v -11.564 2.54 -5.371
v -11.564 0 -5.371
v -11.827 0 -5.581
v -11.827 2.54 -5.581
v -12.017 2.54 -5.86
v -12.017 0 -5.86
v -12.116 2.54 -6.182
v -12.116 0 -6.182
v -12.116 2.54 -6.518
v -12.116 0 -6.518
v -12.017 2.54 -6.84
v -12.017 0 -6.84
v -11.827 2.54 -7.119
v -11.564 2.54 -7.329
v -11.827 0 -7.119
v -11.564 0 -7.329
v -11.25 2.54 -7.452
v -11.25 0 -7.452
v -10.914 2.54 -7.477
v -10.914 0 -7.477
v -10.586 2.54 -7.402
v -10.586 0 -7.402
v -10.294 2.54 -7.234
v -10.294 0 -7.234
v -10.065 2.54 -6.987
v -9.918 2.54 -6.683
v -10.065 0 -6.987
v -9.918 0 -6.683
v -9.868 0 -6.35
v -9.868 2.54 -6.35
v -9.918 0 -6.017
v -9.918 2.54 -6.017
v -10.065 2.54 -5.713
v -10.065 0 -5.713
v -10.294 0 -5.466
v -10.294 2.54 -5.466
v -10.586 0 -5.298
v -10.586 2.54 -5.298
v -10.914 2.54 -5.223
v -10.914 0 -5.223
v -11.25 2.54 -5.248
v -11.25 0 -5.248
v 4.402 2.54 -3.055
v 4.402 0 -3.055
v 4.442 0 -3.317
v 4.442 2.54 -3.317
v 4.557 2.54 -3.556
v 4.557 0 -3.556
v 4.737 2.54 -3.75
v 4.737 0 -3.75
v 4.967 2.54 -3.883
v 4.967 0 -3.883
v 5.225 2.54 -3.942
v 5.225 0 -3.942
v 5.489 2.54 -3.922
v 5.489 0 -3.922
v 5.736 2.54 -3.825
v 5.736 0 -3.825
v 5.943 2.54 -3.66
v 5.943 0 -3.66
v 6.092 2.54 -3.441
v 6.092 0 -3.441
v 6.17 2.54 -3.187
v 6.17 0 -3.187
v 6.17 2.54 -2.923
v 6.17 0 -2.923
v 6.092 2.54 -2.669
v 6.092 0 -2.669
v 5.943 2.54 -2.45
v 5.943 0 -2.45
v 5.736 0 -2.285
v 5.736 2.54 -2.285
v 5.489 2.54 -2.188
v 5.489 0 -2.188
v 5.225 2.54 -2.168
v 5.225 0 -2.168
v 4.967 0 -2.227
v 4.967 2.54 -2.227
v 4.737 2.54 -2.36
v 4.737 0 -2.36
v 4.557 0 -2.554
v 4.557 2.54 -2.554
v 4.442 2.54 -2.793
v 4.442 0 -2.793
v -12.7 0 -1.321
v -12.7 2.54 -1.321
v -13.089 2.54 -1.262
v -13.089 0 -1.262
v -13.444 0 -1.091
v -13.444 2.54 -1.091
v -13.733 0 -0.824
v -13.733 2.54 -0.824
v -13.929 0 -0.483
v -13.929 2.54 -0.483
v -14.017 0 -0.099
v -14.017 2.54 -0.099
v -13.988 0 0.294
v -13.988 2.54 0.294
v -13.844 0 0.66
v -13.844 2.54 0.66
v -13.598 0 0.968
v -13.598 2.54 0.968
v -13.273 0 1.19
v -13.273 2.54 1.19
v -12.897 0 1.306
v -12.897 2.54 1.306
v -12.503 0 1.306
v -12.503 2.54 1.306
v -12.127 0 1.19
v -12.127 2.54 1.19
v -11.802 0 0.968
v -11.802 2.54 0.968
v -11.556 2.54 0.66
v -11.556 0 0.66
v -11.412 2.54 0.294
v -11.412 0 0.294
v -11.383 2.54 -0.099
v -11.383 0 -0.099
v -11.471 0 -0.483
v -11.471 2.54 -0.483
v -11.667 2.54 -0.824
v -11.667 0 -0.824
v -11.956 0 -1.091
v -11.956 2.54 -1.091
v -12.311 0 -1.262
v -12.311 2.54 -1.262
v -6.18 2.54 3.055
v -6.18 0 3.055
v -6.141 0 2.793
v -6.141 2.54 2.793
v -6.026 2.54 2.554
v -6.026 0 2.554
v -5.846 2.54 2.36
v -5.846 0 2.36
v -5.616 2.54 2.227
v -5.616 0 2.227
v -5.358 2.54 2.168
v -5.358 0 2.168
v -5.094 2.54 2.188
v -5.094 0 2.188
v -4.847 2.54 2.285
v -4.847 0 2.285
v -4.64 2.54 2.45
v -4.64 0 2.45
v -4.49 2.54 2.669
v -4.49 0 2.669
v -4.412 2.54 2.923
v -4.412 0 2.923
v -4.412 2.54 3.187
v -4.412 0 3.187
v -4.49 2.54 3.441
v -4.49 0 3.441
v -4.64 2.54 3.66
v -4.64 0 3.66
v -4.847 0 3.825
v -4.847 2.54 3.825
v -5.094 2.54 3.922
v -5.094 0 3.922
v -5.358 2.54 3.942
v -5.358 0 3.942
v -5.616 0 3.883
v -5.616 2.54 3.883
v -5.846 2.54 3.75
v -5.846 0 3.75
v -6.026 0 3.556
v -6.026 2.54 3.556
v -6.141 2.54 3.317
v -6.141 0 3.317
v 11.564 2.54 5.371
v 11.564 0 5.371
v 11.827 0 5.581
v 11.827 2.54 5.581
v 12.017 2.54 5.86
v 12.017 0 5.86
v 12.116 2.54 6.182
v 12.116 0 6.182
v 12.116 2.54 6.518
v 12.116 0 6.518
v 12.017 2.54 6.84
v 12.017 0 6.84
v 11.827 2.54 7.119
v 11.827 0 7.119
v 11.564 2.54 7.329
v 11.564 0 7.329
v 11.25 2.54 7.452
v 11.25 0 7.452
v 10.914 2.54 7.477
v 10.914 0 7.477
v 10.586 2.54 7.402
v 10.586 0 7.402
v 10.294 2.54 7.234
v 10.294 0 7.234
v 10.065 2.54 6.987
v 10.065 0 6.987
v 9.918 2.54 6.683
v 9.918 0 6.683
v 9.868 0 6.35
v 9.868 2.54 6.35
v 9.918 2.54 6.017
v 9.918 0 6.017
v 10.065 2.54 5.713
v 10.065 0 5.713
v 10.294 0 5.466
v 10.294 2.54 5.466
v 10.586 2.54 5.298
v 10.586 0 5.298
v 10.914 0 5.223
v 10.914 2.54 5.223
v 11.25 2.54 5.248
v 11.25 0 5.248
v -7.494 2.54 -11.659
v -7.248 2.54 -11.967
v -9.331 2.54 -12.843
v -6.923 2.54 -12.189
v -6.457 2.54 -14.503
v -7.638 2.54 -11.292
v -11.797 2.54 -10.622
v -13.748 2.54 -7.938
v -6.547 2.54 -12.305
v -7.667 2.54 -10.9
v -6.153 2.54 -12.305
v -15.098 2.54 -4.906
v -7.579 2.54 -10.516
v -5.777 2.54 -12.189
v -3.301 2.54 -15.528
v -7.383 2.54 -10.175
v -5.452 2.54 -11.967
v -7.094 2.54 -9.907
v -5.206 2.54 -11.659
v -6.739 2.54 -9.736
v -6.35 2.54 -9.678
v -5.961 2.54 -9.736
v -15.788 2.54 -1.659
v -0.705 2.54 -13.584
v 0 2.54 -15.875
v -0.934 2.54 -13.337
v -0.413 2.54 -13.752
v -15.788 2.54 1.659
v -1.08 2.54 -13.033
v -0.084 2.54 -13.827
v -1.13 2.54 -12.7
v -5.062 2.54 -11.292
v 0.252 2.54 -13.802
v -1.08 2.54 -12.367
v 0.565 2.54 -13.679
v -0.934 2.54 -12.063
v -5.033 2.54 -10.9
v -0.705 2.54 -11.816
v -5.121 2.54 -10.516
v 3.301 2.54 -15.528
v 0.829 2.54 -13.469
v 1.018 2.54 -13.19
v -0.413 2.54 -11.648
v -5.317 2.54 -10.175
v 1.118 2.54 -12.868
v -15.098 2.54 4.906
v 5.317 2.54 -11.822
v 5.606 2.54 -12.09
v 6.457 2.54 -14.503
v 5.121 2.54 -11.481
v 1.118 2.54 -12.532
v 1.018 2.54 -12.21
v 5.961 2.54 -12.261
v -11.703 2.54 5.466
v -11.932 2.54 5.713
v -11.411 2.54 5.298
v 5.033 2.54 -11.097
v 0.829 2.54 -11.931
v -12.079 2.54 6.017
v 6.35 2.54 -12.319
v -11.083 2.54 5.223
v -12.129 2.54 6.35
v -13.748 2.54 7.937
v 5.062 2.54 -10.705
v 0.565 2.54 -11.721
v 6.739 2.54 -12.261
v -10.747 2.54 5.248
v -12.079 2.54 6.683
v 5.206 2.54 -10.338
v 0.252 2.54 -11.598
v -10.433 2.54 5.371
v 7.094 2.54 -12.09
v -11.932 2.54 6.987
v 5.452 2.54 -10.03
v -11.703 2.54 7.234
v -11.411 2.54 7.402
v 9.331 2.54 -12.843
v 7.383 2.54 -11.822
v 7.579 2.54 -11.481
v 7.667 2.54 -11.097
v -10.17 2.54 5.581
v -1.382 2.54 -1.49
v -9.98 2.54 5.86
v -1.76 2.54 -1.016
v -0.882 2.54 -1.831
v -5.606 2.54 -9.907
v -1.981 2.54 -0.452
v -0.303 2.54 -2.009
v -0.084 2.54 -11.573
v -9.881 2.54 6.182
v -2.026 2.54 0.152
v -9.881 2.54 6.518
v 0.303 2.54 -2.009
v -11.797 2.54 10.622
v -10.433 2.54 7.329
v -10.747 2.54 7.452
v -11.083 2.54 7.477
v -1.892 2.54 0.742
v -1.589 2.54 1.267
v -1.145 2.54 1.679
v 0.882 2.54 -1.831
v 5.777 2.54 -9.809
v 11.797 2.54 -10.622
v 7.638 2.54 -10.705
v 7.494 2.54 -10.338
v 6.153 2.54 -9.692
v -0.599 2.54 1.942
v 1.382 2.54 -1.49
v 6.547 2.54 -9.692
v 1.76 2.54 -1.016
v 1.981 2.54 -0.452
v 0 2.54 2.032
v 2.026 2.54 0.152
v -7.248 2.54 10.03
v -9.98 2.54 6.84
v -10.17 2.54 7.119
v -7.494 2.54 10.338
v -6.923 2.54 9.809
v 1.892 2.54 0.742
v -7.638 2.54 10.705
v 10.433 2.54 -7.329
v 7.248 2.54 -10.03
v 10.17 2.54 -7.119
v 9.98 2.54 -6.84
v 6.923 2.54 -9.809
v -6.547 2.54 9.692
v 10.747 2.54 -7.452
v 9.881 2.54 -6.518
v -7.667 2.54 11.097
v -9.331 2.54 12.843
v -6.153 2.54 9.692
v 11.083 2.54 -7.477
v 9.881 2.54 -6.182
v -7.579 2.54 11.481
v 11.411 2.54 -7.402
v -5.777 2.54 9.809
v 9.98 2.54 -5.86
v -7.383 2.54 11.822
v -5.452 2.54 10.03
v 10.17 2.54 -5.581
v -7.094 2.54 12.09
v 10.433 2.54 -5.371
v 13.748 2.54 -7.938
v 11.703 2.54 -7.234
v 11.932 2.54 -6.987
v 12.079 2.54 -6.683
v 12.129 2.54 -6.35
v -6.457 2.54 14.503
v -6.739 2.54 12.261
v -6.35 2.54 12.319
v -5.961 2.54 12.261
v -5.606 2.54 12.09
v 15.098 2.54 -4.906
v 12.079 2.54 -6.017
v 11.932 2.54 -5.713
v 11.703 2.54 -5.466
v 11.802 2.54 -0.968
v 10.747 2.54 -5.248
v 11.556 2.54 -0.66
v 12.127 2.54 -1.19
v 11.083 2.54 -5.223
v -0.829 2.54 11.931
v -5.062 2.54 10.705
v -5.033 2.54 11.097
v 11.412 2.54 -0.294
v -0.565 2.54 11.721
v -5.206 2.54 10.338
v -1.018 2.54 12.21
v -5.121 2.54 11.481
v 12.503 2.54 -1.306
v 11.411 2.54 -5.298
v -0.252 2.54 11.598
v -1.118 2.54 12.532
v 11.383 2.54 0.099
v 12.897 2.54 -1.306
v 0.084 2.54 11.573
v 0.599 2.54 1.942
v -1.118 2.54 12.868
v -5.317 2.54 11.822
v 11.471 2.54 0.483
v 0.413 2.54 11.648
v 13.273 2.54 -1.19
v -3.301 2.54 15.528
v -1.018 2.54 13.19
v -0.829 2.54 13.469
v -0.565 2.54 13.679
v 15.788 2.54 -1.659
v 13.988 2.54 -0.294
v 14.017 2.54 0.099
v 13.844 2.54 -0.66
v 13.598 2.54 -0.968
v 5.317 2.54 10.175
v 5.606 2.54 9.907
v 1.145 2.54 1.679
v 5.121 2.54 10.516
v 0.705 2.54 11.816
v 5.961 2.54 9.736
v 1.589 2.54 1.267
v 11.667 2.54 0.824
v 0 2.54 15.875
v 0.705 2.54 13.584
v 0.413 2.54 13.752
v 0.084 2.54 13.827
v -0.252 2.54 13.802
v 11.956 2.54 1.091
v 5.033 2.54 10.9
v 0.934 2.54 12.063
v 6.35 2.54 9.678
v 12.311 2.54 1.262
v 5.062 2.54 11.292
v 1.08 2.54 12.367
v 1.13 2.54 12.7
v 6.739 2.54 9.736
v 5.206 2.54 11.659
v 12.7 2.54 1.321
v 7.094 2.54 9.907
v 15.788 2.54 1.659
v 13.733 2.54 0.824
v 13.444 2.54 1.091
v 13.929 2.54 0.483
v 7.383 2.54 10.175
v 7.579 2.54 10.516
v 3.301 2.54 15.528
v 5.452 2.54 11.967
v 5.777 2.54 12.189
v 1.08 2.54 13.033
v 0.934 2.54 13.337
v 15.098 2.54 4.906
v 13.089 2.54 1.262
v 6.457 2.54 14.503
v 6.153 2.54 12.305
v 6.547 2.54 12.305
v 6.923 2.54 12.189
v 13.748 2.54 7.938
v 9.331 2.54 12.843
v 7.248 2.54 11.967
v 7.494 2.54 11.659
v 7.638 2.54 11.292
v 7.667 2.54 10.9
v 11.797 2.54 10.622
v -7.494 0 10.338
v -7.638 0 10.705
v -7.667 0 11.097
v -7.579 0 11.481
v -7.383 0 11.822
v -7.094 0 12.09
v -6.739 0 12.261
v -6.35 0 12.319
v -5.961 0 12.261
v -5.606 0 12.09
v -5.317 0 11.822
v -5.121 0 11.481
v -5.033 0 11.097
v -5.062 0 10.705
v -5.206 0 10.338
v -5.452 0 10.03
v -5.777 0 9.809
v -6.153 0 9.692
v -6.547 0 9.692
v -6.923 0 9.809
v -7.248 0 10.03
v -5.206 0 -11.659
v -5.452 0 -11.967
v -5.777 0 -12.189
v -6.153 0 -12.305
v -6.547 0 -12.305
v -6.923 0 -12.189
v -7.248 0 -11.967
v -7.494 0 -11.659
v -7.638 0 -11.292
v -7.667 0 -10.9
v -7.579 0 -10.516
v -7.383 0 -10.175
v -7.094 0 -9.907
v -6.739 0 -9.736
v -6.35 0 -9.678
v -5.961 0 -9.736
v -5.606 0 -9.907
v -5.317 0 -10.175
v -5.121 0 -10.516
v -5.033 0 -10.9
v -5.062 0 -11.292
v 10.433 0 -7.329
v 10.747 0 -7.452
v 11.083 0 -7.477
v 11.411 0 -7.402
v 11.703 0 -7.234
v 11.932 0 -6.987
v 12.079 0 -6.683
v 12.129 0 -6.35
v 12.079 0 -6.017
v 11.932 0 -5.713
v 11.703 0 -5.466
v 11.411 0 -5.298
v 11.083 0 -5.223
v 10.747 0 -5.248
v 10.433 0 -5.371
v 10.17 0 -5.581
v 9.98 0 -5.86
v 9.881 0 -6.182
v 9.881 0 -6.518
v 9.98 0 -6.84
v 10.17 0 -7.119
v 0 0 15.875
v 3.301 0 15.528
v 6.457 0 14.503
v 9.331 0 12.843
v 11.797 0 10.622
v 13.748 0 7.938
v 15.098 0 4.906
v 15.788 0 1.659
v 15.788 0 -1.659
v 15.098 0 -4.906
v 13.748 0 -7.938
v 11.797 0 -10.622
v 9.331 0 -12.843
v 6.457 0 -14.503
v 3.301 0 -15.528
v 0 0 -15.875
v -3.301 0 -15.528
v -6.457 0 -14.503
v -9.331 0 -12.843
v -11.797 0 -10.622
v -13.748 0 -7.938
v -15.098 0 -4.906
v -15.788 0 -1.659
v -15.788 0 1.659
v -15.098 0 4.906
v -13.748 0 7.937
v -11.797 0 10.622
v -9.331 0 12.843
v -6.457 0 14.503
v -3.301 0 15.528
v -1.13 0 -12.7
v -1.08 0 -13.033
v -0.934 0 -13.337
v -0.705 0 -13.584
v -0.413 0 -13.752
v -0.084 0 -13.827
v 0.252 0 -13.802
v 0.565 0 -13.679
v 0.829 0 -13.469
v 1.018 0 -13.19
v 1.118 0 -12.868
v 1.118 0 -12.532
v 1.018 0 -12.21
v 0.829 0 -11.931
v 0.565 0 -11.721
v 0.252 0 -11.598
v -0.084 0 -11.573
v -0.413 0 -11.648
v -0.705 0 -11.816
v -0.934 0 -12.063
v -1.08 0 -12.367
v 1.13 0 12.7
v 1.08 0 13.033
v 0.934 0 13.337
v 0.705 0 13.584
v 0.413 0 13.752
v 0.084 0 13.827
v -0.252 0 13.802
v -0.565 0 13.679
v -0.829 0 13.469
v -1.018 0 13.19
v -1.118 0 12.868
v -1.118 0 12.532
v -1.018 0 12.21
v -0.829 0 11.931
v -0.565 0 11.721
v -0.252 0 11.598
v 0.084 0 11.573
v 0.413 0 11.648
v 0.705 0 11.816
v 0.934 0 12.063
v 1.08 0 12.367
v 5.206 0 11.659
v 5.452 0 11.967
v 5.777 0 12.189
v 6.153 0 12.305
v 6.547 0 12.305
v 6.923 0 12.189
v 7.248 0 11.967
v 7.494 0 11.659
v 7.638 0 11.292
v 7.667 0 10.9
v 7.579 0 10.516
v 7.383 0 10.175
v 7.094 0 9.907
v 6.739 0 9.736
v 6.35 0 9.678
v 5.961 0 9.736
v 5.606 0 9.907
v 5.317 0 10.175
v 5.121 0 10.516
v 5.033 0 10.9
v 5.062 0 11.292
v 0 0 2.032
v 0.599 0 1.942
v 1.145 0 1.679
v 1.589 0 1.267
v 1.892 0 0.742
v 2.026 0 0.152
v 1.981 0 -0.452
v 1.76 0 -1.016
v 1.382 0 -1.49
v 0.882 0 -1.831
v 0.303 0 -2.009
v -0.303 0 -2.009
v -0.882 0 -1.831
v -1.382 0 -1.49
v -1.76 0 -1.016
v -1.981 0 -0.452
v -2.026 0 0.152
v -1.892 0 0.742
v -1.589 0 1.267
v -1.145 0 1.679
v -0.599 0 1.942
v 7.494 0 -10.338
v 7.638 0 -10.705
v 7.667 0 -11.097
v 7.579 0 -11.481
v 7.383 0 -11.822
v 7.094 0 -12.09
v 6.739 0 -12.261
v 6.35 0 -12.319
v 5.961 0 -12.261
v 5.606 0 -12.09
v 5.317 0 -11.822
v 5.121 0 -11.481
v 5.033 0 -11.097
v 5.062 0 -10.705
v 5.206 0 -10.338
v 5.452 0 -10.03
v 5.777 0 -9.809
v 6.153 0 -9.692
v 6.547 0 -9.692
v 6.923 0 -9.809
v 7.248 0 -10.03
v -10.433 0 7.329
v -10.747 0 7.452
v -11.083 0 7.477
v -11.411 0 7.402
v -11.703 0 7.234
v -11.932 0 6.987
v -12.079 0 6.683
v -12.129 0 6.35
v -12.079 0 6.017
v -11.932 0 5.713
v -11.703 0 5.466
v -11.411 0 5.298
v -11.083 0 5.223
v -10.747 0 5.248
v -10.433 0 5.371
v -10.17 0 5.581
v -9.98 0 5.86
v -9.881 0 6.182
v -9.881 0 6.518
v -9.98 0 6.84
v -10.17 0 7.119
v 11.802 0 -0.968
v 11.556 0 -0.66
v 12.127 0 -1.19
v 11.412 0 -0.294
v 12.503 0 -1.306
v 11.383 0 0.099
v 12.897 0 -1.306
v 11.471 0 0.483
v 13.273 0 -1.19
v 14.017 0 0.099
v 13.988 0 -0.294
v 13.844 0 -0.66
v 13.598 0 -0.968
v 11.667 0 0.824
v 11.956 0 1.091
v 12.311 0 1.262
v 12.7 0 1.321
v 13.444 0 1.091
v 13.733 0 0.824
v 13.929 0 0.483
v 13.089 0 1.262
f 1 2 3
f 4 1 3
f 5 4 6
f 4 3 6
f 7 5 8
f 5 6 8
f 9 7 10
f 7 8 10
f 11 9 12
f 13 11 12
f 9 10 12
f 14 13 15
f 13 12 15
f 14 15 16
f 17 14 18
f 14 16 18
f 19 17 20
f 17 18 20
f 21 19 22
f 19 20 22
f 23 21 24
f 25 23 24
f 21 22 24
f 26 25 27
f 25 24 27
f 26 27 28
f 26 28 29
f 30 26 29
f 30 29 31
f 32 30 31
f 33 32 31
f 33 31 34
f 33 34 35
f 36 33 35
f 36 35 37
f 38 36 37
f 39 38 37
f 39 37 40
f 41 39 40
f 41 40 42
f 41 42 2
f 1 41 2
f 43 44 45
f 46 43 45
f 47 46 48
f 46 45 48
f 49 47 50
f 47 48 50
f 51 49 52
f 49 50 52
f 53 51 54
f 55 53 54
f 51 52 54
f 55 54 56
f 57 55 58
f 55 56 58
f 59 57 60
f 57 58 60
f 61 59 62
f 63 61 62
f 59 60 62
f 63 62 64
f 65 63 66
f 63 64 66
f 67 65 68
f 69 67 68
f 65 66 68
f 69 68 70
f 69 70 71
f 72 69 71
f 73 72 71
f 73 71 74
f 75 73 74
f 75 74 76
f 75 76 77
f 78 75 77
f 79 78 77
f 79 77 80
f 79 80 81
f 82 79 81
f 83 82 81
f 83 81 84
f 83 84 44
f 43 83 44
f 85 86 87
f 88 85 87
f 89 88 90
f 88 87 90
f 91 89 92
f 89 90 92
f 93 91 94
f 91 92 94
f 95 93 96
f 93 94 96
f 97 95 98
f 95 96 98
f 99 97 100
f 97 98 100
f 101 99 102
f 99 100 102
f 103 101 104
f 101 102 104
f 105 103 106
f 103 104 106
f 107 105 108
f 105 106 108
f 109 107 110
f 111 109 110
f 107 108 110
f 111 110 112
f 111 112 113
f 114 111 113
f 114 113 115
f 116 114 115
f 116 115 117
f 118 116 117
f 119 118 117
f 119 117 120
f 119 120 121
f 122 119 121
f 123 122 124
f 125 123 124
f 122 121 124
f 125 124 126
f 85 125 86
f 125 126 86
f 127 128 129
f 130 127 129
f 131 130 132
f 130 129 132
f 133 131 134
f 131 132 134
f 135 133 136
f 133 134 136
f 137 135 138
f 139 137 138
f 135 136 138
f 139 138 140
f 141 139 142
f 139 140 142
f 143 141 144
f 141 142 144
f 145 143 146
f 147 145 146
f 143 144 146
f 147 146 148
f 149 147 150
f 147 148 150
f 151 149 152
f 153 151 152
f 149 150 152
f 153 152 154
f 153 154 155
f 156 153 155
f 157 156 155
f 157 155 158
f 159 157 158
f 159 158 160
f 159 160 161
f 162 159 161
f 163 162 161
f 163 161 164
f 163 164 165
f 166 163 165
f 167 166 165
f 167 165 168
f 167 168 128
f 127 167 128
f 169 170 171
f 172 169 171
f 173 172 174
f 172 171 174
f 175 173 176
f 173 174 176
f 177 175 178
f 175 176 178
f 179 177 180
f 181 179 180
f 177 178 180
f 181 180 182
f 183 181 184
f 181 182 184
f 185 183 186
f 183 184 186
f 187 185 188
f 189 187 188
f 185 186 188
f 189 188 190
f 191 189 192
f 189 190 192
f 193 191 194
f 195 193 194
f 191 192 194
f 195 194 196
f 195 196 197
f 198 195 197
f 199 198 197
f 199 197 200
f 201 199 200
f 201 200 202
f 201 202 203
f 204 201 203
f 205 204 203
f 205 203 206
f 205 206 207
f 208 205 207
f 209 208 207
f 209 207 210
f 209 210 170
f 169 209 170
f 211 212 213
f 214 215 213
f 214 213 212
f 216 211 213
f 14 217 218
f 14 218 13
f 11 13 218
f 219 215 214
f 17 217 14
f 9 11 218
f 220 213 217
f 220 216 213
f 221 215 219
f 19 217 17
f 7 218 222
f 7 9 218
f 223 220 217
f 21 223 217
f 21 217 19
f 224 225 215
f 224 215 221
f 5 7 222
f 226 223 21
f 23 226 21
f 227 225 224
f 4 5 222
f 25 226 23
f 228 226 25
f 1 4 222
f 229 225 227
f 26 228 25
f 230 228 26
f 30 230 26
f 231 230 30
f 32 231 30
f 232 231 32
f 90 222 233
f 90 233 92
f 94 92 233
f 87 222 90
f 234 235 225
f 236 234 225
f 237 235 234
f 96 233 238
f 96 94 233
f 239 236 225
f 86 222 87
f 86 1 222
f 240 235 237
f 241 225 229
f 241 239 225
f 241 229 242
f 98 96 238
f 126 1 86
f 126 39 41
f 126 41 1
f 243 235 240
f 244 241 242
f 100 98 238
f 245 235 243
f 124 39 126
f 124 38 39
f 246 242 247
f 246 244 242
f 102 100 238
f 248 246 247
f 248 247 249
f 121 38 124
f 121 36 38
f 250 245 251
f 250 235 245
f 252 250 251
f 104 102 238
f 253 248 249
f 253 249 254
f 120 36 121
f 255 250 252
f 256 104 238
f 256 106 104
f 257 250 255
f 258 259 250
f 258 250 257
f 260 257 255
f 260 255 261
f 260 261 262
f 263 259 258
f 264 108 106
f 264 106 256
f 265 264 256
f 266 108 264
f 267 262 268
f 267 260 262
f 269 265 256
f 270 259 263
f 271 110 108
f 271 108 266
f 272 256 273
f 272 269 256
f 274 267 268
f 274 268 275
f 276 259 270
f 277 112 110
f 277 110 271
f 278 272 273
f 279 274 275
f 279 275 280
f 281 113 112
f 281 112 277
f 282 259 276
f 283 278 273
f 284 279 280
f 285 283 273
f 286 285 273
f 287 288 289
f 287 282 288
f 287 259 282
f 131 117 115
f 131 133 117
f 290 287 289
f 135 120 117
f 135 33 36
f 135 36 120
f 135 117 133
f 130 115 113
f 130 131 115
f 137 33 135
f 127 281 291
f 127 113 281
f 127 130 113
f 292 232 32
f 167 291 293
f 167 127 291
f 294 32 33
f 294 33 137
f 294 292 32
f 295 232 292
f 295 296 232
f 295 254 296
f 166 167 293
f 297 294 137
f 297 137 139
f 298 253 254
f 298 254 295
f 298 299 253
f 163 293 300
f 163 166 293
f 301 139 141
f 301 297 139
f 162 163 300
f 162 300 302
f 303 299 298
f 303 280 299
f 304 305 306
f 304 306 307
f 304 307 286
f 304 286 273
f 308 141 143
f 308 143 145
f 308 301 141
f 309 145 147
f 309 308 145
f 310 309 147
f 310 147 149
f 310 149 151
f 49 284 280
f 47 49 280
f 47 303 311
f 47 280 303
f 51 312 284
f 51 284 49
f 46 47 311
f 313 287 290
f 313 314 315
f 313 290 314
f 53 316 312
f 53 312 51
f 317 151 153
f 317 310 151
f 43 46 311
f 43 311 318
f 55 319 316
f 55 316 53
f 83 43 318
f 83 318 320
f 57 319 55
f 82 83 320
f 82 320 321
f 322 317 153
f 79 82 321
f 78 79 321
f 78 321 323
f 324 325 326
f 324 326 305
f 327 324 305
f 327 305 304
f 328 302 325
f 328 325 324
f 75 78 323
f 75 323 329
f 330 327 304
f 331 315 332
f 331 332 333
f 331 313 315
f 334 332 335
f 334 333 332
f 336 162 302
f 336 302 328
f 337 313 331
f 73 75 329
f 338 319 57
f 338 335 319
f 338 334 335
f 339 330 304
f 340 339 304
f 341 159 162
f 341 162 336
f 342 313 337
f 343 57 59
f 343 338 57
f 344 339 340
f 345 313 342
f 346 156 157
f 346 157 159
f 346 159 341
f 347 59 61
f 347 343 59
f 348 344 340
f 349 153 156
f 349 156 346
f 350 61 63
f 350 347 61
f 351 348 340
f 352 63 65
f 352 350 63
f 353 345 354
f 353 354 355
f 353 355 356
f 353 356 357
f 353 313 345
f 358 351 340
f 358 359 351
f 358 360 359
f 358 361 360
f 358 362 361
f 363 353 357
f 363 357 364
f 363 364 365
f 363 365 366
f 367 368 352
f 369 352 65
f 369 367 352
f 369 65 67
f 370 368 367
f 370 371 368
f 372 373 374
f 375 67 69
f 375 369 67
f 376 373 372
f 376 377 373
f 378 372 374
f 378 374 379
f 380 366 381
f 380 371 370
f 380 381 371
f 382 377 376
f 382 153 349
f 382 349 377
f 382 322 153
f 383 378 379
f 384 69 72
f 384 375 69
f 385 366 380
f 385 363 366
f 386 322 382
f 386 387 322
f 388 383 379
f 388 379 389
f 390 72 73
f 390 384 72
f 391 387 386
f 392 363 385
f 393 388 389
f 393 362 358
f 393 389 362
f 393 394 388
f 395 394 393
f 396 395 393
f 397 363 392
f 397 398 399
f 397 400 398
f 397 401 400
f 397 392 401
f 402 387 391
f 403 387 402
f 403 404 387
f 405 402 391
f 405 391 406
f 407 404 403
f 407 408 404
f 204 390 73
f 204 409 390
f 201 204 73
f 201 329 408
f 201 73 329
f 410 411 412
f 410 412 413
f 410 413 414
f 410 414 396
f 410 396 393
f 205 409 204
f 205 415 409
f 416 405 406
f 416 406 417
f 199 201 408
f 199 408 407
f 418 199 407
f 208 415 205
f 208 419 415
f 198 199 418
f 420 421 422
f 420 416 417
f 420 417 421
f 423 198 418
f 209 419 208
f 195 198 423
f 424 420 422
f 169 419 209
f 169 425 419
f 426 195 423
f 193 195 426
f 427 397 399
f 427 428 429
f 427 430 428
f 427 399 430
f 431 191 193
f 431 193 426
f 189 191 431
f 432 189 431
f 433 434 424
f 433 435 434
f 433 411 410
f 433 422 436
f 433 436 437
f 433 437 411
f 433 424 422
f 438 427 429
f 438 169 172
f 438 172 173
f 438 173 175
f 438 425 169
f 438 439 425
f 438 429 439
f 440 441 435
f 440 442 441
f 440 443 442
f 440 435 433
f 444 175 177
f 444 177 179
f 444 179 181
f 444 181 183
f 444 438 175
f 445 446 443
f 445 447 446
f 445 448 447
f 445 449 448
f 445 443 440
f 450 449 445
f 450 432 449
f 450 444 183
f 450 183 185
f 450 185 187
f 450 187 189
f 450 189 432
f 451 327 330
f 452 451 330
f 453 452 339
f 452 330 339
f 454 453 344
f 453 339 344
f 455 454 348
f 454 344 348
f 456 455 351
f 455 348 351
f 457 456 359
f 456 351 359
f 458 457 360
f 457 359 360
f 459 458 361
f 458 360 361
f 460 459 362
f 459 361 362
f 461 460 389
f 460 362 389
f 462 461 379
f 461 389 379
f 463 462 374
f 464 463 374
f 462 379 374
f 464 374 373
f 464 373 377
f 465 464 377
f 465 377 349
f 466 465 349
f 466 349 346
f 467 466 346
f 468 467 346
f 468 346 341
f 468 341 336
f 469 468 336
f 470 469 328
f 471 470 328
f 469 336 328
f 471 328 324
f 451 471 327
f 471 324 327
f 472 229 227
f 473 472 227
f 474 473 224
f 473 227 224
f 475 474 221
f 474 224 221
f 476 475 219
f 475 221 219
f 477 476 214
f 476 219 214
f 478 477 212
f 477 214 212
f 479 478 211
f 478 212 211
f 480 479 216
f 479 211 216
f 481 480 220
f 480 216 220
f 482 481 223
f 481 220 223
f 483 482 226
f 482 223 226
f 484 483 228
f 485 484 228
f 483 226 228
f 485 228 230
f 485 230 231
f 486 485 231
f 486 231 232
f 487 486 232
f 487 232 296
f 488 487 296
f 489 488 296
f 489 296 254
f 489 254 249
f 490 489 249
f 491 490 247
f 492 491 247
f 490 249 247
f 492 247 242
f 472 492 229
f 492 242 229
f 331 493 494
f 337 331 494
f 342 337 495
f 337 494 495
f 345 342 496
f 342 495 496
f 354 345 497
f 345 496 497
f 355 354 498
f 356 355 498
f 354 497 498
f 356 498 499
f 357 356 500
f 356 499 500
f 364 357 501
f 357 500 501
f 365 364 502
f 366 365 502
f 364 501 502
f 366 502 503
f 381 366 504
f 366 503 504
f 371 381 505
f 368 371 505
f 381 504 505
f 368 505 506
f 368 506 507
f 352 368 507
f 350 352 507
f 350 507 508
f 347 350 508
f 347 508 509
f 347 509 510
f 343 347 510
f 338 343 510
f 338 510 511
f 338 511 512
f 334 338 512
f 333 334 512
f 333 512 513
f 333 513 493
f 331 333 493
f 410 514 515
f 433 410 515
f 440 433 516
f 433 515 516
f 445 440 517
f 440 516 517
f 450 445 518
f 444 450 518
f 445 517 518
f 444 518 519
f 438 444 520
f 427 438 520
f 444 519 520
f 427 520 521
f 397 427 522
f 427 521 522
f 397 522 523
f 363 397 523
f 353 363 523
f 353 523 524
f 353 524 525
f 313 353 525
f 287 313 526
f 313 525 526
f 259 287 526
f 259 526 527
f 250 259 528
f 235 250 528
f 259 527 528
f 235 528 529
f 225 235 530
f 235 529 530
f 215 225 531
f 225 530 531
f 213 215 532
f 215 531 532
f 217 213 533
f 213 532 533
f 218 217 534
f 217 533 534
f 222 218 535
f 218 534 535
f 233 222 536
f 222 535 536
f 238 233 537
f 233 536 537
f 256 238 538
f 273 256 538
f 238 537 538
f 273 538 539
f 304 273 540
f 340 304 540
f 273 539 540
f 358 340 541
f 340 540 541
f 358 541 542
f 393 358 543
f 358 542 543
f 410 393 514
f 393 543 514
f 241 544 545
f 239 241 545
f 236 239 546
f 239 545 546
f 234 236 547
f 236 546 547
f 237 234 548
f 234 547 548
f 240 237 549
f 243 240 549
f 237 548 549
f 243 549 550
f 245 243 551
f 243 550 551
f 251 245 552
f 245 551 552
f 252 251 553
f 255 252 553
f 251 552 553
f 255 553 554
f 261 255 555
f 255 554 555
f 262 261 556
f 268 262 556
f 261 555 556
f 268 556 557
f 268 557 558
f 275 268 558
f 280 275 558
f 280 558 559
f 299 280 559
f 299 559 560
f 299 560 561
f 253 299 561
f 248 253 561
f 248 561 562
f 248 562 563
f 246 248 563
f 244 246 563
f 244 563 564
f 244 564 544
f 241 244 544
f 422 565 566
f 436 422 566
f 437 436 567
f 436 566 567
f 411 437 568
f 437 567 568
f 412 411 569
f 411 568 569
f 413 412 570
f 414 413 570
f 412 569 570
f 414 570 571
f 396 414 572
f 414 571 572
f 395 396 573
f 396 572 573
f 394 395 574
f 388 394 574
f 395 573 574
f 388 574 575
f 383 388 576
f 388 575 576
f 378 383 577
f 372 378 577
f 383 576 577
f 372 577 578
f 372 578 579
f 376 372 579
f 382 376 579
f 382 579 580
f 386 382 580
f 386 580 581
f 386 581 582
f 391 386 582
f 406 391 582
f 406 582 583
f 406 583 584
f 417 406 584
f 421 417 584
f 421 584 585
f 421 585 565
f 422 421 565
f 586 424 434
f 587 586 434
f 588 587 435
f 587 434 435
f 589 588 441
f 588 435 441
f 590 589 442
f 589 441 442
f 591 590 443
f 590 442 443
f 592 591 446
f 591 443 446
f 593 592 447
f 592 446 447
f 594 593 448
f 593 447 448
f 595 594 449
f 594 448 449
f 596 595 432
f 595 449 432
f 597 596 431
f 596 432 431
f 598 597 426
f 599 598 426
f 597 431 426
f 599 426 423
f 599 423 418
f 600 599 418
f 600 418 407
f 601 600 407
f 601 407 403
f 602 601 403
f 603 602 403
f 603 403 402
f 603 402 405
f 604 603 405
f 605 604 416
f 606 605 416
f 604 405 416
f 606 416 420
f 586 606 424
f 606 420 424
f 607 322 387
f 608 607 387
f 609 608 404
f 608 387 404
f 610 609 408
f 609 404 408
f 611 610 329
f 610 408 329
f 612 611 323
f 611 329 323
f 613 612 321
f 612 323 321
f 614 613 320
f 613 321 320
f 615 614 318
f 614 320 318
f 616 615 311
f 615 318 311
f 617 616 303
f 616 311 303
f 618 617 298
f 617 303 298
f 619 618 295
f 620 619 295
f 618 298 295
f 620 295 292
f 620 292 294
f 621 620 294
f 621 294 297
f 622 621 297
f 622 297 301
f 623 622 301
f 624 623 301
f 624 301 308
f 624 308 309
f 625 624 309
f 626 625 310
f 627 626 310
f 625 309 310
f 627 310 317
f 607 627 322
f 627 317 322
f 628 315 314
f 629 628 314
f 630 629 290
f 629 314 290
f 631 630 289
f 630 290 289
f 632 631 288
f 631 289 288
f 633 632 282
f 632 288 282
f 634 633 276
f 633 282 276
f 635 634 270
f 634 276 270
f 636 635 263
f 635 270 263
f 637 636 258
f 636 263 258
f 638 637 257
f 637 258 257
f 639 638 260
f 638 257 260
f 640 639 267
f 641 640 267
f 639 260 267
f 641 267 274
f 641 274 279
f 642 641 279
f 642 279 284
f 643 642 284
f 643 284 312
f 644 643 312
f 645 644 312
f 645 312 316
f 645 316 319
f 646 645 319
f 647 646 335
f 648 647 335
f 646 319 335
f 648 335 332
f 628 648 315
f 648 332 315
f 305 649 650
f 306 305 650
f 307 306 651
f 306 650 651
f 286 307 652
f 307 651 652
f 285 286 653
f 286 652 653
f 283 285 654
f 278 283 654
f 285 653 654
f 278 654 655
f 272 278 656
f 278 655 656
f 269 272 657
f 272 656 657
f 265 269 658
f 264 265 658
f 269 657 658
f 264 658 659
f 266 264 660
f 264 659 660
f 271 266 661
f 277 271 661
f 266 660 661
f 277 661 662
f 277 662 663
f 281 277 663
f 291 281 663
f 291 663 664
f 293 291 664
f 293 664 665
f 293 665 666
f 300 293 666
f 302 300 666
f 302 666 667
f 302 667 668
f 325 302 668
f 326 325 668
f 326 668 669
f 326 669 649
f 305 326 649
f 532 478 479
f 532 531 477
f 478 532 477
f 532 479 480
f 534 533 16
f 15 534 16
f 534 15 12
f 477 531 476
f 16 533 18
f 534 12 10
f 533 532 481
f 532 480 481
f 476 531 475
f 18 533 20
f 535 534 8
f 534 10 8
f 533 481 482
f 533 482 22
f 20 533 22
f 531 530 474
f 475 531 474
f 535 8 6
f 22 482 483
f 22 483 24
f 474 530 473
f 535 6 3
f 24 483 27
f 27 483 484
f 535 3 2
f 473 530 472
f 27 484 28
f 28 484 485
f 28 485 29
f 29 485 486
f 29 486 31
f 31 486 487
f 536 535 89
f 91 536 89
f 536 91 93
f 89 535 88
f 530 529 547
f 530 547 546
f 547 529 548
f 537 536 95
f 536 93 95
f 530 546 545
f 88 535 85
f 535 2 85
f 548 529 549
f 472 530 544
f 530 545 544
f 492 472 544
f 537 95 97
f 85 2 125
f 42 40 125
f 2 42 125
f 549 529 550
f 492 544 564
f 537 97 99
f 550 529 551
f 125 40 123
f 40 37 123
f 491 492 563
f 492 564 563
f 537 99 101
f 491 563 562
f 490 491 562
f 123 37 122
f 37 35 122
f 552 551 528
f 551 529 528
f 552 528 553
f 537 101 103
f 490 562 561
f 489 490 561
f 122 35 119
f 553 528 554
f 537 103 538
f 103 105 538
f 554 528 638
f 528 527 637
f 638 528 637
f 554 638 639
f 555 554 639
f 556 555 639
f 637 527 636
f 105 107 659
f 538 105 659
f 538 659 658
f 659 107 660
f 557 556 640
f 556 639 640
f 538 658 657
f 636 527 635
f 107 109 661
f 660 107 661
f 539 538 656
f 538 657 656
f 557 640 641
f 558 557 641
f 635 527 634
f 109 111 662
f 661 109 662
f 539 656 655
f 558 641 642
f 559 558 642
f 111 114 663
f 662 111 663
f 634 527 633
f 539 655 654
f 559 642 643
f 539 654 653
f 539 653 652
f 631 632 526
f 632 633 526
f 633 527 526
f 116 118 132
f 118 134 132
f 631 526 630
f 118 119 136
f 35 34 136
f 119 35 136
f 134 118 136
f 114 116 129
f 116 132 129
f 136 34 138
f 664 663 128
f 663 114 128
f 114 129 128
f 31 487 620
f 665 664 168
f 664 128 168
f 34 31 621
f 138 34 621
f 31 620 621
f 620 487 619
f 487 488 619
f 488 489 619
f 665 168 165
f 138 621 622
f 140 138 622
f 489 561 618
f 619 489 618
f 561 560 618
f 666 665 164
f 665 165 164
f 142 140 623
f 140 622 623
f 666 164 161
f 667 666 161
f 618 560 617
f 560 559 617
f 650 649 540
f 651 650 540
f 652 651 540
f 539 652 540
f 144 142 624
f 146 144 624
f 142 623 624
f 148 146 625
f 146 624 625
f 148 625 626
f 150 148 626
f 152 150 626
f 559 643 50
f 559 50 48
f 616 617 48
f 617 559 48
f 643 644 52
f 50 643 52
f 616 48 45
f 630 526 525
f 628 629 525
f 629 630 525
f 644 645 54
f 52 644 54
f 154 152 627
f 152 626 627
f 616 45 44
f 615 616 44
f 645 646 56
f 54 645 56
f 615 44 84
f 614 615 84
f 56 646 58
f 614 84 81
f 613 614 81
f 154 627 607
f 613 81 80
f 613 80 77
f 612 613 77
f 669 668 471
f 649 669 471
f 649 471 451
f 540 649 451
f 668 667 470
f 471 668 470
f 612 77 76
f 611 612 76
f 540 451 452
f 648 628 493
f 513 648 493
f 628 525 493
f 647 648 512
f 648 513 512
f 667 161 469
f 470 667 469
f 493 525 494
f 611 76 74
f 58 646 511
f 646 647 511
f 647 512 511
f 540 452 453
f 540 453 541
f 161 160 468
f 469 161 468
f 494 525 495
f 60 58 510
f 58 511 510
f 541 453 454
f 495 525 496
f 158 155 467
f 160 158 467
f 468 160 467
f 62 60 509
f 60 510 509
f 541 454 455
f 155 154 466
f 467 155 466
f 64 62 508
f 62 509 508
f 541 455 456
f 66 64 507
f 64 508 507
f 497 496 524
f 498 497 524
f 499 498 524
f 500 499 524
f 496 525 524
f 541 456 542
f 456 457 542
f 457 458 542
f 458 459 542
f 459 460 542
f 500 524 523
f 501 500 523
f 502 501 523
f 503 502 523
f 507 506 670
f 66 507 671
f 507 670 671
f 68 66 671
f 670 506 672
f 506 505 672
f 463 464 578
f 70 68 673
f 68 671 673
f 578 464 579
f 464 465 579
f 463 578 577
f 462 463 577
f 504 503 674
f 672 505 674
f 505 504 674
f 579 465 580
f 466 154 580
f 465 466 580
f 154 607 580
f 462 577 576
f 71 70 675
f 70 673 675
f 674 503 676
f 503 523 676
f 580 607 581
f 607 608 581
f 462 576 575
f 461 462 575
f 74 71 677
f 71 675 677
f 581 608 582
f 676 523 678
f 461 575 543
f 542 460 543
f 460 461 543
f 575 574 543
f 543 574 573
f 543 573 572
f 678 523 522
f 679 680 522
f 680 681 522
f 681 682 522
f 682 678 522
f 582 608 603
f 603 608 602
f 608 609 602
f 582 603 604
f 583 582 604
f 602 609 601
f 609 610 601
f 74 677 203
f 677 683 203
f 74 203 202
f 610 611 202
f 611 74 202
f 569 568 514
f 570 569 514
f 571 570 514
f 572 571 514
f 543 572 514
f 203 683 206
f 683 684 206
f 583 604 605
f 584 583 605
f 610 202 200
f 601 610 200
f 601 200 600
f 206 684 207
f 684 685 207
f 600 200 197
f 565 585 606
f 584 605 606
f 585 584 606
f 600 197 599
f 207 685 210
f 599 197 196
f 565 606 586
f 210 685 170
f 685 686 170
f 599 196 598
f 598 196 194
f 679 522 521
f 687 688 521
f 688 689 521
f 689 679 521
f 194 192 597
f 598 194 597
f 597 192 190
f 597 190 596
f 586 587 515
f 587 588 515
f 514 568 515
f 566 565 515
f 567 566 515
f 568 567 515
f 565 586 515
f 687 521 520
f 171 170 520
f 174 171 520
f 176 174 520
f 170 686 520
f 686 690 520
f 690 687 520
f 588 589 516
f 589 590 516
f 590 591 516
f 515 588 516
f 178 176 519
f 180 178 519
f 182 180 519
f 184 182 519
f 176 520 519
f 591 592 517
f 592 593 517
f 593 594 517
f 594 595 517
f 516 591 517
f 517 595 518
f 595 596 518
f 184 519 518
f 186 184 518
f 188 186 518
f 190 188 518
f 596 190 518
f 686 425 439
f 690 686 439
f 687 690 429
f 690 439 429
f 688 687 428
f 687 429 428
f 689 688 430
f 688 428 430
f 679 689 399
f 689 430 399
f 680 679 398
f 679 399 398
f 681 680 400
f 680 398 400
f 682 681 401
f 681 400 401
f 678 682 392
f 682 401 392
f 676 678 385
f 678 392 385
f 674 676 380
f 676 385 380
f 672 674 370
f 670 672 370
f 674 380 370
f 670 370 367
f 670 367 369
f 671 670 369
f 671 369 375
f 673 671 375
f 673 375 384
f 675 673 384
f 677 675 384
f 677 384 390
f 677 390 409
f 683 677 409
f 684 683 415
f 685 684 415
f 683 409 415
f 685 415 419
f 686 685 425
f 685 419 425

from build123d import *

# Parameters (mm, degrees)
SKETCH1_R                 = 15.875
BOSS_EXTRUDE1_DEPTH       = 2.54
TAP_DRILL_FOR_4_40_TAP1_D = 2.2606
CIRPATTERN1_COUNT         = 6
SKETCH8_R                 = 2.032
CUT_EXTRUDE1_DEPTH        = 2.54
SKETCH15_R                = 1.3208
CUT_EXTRUDE2_DEPTH        = 2.54
CIRPATTERN2_COUNT         = 6
F_2_56_TAPPED_HOLE1_D     = 1.778
F_2_56_TAPPED_HOLE2_D     = 1.778


with BuildPart() as part:
    # Sketch1 → Boss-Extrude1 (new body)
    with BuildSketch(Plane(origin=(0, 0, 0), x_dir=(1, 0, 0), z_dir=(0, 1, 0))):
        with Locations(Location((0, 0, 0), (0, 0, 270))):
            Circle(SKETCH1_R)
    extrude(amount=BOSS_EXTRUDE1_DEPTH)

    # Tap Drill for #4-40 Tap1 (through all)
    with Locations(Plane(origin=(0, 2.54, 0), x_dir=(1, 0, 0), z_dir=(0, 1, 0))):
        with Locations((0, 12.7)):
            tap_drill_for_4_40_tap1 = Hole(TAP_DRILL_FOR_4_40_TAP1_D / 2)

    # CirPattern1: Tap Drill for #4-40 Tap1 ×6 about axis
    cirpattern1_axis = Axis((0, 0, 0), (0, 1, 0))
    for i in range(1, CIRPATTERN1_COUNT):
        add(tap_drill_for_4_40_tap1.rotate(cirpattern1_axis, i * 360 / CIRPATTERN1_COUNT), mode=Mode.SUBTRACT)

    # Sketch8 → Cut-Extrude1 (cut)
    with BuildSketch(Plane(origin=(0, 2.54, 0), x_dir=(1, 0, 0), z_dir=(0, 1, 0))):
        with Locations(Location((0, 0, 0), (0, 0, 270))):
            Circle(SKETCH8_R)
    extrude(amount=-CUT_EXTRUDE1_DEPTH, mode=Mode.SUBTRACT)

    # Sketch15 → Cut-Extrude2 (cut)
    with BuildSketch(Plane(origin=(0, 2.54, 0), x_dir=(1, 0, 0), z_dir=(0, 1, 0))):
        with Locations(Location((12.7, 0, 0), (0, 0, 270))):
            Circle(SKETCH15_R)
    cut_extrude2 = extrude(amount=-CUT_EXTRUDE2_DEPTH, mode=Mode.SUBTRACT)

    # CirPattern2: Cut-Extrude2 ×6 about axis
    cirpattern2_axis = Axis((0, 0, 0), (0, 1, 0))
    for i in range(1, CIRPATTERN2_COUNT):
        add(cut_extrude2.rotate(cirpattern2_axis, i * 360 / CIRPATTERN2_COUNT), mode=Mode.SUBTRACT)

    # #2-56 Tapped Hole1 (through all)
    with Locations(Plane(origin=(0, 2.54, 0), x_dir=(1, 0, 0), z_dir=(0, 1, 0))):
        with Locations((-5.291415217, -3.055)):
            Hole(F_2_56_TAPPED_HOLE1_D / 2)

    # #2-56 Tapped Hole2 (through all)
    with Locations(Plane(origin=(0, 2.54, 0), x_dir=(1, 0, 0), z_dir=(0, 1, 0))):
        with Locations((5.291415217, 3.055)):
            Hole(F_2_56_TAPPED_HOLE2_D / 2)


solid = part.part
